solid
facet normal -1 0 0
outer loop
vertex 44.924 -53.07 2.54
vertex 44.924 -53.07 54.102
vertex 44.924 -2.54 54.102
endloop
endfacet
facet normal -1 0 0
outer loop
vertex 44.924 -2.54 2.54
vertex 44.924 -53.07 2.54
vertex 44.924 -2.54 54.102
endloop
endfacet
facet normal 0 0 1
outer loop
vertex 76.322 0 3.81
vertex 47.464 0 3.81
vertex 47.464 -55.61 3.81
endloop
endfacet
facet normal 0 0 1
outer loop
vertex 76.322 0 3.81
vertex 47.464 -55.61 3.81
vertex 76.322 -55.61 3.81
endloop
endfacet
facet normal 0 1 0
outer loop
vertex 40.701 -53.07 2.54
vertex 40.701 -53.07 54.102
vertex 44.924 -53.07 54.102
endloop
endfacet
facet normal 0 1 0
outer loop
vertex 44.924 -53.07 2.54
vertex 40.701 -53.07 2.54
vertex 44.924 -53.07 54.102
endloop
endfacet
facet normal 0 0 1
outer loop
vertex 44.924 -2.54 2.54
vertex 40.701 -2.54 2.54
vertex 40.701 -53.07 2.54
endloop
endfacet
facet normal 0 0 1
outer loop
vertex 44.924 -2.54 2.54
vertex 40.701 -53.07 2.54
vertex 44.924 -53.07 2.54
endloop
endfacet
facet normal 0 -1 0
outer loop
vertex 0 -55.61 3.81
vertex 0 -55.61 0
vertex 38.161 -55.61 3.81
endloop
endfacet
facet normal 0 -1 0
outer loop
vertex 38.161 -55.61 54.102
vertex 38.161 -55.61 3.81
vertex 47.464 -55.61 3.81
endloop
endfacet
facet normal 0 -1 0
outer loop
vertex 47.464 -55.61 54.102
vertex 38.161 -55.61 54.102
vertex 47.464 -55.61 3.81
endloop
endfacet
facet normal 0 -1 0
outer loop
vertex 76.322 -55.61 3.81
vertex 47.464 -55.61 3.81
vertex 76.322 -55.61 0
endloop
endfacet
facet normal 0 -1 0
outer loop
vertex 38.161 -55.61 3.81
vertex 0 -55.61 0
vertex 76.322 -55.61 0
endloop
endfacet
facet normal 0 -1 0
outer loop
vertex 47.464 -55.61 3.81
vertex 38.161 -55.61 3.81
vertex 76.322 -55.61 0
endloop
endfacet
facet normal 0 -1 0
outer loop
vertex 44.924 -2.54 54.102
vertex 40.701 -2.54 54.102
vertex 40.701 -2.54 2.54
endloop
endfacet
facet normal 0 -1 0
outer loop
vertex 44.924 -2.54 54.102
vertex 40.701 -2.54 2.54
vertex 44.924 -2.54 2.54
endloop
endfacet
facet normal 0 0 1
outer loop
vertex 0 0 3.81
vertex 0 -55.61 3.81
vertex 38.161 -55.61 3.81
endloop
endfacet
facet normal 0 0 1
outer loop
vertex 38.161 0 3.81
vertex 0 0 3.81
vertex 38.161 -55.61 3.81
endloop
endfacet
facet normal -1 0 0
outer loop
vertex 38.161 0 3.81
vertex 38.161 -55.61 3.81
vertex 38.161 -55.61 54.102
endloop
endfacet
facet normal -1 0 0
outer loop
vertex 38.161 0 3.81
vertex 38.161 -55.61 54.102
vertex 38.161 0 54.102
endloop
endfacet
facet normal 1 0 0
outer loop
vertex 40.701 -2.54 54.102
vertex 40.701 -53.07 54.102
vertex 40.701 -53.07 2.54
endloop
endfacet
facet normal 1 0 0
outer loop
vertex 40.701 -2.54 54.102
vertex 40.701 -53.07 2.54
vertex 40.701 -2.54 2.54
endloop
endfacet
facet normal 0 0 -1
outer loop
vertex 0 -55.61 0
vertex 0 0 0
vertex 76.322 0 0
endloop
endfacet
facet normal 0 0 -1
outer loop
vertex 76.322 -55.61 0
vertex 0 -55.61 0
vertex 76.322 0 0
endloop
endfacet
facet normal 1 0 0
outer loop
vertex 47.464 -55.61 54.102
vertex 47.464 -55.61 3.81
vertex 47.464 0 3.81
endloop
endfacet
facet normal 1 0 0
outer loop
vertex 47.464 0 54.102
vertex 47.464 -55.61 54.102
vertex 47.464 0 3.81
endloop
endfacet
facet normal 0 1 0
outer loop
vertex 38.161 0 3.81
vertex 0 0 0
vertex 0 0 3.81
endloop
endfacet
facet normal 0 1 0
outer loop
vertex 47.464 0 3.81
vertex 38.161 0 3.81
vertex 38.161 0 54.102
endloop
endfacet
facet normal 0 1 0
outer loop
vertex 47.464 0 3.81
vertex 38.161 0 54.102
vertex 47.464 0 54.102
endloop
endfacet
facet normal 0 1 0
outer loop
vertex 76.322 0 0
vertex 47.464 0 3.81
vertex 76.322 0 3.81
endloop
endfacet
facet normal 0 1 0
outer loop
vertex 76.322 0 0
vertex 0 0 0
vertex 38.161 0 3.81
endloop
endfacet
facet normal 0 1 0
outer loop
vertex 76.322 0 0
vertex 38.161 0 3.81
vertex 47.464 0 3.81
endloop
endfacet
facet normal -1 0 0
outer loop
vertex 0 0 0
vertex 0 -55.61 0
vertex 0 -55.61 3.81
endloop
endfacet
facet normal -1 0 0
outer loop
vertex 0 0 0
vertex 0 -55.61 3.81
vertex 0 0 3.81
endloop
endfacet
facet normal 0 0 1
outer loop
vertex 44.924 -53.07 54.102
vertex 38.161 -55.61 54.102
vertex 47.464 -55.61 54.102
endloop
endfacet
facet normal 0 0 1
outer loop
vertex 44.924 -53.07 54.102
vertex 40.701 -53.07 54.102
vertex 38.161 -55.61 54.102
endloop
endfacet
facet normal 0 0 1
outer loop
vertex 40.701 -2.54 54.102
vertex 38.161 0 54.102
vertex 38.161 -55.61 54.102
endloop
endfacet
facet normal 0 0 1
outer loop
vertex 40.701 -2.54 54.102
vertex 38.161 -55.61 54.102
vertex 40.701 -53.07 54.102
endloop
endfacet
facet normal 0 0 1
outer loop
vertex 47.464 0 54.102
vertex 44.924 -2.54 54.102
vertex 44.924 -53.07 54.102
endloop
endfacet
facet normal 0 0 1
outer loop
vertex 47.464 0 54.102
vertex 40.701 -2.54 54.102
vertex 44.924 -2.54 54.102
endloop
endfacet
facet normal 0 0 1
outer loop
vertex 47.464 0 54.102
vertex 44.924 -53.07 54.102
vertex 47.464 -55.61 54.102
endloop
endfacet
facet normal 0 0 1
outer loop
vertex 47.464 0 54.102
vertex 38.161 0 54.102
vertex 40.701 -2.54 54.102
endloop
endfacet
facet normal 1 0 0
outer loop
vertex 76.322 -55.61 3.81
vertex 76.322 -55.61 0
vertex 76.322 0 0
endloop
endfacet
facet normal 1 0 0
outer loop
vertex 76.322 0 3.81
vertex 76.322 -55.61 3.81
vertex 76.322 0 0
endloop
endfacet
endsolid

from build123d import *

# Parameters (mm, degrees)
F0_W     = 76.3216018677
F0_H     = 55.6097887456
F1_DEPTH = 3.81
F2_W     = 9.3032829463
F2_H     = 55.6097887456
F3_DEPTH = 50.292
F4_T     = -2.54


with BuildPart() as f1:
    # F0 (on Top) → F1 (new body)
    with BuildSketch(Plane.XY):
        with Locations((38.1608009338, -27.8048943728)):
            Rectangle(F0_W, F0_H)
    extrude(amount=F1_DEPTH)

    # F2 (on face) → F3 (join)
    with BuildSketch(Plane.XY.offset(3.81)):
        with Locations((42.812442407, -27.8048943728)):
            Rectangle(F2_W, F2_H)
    extrude(amount=F3_DEPTH)

    # F4
    f4_openings = [f1.faces().sort_by_distance(p)[0] for p in [
        (42.812442, -27.804894, 54.102),
    ]]
    offset(amount=F4_T, openings=f4_openings, kind=Kind.INTERSECTION)


solid = f1.part
